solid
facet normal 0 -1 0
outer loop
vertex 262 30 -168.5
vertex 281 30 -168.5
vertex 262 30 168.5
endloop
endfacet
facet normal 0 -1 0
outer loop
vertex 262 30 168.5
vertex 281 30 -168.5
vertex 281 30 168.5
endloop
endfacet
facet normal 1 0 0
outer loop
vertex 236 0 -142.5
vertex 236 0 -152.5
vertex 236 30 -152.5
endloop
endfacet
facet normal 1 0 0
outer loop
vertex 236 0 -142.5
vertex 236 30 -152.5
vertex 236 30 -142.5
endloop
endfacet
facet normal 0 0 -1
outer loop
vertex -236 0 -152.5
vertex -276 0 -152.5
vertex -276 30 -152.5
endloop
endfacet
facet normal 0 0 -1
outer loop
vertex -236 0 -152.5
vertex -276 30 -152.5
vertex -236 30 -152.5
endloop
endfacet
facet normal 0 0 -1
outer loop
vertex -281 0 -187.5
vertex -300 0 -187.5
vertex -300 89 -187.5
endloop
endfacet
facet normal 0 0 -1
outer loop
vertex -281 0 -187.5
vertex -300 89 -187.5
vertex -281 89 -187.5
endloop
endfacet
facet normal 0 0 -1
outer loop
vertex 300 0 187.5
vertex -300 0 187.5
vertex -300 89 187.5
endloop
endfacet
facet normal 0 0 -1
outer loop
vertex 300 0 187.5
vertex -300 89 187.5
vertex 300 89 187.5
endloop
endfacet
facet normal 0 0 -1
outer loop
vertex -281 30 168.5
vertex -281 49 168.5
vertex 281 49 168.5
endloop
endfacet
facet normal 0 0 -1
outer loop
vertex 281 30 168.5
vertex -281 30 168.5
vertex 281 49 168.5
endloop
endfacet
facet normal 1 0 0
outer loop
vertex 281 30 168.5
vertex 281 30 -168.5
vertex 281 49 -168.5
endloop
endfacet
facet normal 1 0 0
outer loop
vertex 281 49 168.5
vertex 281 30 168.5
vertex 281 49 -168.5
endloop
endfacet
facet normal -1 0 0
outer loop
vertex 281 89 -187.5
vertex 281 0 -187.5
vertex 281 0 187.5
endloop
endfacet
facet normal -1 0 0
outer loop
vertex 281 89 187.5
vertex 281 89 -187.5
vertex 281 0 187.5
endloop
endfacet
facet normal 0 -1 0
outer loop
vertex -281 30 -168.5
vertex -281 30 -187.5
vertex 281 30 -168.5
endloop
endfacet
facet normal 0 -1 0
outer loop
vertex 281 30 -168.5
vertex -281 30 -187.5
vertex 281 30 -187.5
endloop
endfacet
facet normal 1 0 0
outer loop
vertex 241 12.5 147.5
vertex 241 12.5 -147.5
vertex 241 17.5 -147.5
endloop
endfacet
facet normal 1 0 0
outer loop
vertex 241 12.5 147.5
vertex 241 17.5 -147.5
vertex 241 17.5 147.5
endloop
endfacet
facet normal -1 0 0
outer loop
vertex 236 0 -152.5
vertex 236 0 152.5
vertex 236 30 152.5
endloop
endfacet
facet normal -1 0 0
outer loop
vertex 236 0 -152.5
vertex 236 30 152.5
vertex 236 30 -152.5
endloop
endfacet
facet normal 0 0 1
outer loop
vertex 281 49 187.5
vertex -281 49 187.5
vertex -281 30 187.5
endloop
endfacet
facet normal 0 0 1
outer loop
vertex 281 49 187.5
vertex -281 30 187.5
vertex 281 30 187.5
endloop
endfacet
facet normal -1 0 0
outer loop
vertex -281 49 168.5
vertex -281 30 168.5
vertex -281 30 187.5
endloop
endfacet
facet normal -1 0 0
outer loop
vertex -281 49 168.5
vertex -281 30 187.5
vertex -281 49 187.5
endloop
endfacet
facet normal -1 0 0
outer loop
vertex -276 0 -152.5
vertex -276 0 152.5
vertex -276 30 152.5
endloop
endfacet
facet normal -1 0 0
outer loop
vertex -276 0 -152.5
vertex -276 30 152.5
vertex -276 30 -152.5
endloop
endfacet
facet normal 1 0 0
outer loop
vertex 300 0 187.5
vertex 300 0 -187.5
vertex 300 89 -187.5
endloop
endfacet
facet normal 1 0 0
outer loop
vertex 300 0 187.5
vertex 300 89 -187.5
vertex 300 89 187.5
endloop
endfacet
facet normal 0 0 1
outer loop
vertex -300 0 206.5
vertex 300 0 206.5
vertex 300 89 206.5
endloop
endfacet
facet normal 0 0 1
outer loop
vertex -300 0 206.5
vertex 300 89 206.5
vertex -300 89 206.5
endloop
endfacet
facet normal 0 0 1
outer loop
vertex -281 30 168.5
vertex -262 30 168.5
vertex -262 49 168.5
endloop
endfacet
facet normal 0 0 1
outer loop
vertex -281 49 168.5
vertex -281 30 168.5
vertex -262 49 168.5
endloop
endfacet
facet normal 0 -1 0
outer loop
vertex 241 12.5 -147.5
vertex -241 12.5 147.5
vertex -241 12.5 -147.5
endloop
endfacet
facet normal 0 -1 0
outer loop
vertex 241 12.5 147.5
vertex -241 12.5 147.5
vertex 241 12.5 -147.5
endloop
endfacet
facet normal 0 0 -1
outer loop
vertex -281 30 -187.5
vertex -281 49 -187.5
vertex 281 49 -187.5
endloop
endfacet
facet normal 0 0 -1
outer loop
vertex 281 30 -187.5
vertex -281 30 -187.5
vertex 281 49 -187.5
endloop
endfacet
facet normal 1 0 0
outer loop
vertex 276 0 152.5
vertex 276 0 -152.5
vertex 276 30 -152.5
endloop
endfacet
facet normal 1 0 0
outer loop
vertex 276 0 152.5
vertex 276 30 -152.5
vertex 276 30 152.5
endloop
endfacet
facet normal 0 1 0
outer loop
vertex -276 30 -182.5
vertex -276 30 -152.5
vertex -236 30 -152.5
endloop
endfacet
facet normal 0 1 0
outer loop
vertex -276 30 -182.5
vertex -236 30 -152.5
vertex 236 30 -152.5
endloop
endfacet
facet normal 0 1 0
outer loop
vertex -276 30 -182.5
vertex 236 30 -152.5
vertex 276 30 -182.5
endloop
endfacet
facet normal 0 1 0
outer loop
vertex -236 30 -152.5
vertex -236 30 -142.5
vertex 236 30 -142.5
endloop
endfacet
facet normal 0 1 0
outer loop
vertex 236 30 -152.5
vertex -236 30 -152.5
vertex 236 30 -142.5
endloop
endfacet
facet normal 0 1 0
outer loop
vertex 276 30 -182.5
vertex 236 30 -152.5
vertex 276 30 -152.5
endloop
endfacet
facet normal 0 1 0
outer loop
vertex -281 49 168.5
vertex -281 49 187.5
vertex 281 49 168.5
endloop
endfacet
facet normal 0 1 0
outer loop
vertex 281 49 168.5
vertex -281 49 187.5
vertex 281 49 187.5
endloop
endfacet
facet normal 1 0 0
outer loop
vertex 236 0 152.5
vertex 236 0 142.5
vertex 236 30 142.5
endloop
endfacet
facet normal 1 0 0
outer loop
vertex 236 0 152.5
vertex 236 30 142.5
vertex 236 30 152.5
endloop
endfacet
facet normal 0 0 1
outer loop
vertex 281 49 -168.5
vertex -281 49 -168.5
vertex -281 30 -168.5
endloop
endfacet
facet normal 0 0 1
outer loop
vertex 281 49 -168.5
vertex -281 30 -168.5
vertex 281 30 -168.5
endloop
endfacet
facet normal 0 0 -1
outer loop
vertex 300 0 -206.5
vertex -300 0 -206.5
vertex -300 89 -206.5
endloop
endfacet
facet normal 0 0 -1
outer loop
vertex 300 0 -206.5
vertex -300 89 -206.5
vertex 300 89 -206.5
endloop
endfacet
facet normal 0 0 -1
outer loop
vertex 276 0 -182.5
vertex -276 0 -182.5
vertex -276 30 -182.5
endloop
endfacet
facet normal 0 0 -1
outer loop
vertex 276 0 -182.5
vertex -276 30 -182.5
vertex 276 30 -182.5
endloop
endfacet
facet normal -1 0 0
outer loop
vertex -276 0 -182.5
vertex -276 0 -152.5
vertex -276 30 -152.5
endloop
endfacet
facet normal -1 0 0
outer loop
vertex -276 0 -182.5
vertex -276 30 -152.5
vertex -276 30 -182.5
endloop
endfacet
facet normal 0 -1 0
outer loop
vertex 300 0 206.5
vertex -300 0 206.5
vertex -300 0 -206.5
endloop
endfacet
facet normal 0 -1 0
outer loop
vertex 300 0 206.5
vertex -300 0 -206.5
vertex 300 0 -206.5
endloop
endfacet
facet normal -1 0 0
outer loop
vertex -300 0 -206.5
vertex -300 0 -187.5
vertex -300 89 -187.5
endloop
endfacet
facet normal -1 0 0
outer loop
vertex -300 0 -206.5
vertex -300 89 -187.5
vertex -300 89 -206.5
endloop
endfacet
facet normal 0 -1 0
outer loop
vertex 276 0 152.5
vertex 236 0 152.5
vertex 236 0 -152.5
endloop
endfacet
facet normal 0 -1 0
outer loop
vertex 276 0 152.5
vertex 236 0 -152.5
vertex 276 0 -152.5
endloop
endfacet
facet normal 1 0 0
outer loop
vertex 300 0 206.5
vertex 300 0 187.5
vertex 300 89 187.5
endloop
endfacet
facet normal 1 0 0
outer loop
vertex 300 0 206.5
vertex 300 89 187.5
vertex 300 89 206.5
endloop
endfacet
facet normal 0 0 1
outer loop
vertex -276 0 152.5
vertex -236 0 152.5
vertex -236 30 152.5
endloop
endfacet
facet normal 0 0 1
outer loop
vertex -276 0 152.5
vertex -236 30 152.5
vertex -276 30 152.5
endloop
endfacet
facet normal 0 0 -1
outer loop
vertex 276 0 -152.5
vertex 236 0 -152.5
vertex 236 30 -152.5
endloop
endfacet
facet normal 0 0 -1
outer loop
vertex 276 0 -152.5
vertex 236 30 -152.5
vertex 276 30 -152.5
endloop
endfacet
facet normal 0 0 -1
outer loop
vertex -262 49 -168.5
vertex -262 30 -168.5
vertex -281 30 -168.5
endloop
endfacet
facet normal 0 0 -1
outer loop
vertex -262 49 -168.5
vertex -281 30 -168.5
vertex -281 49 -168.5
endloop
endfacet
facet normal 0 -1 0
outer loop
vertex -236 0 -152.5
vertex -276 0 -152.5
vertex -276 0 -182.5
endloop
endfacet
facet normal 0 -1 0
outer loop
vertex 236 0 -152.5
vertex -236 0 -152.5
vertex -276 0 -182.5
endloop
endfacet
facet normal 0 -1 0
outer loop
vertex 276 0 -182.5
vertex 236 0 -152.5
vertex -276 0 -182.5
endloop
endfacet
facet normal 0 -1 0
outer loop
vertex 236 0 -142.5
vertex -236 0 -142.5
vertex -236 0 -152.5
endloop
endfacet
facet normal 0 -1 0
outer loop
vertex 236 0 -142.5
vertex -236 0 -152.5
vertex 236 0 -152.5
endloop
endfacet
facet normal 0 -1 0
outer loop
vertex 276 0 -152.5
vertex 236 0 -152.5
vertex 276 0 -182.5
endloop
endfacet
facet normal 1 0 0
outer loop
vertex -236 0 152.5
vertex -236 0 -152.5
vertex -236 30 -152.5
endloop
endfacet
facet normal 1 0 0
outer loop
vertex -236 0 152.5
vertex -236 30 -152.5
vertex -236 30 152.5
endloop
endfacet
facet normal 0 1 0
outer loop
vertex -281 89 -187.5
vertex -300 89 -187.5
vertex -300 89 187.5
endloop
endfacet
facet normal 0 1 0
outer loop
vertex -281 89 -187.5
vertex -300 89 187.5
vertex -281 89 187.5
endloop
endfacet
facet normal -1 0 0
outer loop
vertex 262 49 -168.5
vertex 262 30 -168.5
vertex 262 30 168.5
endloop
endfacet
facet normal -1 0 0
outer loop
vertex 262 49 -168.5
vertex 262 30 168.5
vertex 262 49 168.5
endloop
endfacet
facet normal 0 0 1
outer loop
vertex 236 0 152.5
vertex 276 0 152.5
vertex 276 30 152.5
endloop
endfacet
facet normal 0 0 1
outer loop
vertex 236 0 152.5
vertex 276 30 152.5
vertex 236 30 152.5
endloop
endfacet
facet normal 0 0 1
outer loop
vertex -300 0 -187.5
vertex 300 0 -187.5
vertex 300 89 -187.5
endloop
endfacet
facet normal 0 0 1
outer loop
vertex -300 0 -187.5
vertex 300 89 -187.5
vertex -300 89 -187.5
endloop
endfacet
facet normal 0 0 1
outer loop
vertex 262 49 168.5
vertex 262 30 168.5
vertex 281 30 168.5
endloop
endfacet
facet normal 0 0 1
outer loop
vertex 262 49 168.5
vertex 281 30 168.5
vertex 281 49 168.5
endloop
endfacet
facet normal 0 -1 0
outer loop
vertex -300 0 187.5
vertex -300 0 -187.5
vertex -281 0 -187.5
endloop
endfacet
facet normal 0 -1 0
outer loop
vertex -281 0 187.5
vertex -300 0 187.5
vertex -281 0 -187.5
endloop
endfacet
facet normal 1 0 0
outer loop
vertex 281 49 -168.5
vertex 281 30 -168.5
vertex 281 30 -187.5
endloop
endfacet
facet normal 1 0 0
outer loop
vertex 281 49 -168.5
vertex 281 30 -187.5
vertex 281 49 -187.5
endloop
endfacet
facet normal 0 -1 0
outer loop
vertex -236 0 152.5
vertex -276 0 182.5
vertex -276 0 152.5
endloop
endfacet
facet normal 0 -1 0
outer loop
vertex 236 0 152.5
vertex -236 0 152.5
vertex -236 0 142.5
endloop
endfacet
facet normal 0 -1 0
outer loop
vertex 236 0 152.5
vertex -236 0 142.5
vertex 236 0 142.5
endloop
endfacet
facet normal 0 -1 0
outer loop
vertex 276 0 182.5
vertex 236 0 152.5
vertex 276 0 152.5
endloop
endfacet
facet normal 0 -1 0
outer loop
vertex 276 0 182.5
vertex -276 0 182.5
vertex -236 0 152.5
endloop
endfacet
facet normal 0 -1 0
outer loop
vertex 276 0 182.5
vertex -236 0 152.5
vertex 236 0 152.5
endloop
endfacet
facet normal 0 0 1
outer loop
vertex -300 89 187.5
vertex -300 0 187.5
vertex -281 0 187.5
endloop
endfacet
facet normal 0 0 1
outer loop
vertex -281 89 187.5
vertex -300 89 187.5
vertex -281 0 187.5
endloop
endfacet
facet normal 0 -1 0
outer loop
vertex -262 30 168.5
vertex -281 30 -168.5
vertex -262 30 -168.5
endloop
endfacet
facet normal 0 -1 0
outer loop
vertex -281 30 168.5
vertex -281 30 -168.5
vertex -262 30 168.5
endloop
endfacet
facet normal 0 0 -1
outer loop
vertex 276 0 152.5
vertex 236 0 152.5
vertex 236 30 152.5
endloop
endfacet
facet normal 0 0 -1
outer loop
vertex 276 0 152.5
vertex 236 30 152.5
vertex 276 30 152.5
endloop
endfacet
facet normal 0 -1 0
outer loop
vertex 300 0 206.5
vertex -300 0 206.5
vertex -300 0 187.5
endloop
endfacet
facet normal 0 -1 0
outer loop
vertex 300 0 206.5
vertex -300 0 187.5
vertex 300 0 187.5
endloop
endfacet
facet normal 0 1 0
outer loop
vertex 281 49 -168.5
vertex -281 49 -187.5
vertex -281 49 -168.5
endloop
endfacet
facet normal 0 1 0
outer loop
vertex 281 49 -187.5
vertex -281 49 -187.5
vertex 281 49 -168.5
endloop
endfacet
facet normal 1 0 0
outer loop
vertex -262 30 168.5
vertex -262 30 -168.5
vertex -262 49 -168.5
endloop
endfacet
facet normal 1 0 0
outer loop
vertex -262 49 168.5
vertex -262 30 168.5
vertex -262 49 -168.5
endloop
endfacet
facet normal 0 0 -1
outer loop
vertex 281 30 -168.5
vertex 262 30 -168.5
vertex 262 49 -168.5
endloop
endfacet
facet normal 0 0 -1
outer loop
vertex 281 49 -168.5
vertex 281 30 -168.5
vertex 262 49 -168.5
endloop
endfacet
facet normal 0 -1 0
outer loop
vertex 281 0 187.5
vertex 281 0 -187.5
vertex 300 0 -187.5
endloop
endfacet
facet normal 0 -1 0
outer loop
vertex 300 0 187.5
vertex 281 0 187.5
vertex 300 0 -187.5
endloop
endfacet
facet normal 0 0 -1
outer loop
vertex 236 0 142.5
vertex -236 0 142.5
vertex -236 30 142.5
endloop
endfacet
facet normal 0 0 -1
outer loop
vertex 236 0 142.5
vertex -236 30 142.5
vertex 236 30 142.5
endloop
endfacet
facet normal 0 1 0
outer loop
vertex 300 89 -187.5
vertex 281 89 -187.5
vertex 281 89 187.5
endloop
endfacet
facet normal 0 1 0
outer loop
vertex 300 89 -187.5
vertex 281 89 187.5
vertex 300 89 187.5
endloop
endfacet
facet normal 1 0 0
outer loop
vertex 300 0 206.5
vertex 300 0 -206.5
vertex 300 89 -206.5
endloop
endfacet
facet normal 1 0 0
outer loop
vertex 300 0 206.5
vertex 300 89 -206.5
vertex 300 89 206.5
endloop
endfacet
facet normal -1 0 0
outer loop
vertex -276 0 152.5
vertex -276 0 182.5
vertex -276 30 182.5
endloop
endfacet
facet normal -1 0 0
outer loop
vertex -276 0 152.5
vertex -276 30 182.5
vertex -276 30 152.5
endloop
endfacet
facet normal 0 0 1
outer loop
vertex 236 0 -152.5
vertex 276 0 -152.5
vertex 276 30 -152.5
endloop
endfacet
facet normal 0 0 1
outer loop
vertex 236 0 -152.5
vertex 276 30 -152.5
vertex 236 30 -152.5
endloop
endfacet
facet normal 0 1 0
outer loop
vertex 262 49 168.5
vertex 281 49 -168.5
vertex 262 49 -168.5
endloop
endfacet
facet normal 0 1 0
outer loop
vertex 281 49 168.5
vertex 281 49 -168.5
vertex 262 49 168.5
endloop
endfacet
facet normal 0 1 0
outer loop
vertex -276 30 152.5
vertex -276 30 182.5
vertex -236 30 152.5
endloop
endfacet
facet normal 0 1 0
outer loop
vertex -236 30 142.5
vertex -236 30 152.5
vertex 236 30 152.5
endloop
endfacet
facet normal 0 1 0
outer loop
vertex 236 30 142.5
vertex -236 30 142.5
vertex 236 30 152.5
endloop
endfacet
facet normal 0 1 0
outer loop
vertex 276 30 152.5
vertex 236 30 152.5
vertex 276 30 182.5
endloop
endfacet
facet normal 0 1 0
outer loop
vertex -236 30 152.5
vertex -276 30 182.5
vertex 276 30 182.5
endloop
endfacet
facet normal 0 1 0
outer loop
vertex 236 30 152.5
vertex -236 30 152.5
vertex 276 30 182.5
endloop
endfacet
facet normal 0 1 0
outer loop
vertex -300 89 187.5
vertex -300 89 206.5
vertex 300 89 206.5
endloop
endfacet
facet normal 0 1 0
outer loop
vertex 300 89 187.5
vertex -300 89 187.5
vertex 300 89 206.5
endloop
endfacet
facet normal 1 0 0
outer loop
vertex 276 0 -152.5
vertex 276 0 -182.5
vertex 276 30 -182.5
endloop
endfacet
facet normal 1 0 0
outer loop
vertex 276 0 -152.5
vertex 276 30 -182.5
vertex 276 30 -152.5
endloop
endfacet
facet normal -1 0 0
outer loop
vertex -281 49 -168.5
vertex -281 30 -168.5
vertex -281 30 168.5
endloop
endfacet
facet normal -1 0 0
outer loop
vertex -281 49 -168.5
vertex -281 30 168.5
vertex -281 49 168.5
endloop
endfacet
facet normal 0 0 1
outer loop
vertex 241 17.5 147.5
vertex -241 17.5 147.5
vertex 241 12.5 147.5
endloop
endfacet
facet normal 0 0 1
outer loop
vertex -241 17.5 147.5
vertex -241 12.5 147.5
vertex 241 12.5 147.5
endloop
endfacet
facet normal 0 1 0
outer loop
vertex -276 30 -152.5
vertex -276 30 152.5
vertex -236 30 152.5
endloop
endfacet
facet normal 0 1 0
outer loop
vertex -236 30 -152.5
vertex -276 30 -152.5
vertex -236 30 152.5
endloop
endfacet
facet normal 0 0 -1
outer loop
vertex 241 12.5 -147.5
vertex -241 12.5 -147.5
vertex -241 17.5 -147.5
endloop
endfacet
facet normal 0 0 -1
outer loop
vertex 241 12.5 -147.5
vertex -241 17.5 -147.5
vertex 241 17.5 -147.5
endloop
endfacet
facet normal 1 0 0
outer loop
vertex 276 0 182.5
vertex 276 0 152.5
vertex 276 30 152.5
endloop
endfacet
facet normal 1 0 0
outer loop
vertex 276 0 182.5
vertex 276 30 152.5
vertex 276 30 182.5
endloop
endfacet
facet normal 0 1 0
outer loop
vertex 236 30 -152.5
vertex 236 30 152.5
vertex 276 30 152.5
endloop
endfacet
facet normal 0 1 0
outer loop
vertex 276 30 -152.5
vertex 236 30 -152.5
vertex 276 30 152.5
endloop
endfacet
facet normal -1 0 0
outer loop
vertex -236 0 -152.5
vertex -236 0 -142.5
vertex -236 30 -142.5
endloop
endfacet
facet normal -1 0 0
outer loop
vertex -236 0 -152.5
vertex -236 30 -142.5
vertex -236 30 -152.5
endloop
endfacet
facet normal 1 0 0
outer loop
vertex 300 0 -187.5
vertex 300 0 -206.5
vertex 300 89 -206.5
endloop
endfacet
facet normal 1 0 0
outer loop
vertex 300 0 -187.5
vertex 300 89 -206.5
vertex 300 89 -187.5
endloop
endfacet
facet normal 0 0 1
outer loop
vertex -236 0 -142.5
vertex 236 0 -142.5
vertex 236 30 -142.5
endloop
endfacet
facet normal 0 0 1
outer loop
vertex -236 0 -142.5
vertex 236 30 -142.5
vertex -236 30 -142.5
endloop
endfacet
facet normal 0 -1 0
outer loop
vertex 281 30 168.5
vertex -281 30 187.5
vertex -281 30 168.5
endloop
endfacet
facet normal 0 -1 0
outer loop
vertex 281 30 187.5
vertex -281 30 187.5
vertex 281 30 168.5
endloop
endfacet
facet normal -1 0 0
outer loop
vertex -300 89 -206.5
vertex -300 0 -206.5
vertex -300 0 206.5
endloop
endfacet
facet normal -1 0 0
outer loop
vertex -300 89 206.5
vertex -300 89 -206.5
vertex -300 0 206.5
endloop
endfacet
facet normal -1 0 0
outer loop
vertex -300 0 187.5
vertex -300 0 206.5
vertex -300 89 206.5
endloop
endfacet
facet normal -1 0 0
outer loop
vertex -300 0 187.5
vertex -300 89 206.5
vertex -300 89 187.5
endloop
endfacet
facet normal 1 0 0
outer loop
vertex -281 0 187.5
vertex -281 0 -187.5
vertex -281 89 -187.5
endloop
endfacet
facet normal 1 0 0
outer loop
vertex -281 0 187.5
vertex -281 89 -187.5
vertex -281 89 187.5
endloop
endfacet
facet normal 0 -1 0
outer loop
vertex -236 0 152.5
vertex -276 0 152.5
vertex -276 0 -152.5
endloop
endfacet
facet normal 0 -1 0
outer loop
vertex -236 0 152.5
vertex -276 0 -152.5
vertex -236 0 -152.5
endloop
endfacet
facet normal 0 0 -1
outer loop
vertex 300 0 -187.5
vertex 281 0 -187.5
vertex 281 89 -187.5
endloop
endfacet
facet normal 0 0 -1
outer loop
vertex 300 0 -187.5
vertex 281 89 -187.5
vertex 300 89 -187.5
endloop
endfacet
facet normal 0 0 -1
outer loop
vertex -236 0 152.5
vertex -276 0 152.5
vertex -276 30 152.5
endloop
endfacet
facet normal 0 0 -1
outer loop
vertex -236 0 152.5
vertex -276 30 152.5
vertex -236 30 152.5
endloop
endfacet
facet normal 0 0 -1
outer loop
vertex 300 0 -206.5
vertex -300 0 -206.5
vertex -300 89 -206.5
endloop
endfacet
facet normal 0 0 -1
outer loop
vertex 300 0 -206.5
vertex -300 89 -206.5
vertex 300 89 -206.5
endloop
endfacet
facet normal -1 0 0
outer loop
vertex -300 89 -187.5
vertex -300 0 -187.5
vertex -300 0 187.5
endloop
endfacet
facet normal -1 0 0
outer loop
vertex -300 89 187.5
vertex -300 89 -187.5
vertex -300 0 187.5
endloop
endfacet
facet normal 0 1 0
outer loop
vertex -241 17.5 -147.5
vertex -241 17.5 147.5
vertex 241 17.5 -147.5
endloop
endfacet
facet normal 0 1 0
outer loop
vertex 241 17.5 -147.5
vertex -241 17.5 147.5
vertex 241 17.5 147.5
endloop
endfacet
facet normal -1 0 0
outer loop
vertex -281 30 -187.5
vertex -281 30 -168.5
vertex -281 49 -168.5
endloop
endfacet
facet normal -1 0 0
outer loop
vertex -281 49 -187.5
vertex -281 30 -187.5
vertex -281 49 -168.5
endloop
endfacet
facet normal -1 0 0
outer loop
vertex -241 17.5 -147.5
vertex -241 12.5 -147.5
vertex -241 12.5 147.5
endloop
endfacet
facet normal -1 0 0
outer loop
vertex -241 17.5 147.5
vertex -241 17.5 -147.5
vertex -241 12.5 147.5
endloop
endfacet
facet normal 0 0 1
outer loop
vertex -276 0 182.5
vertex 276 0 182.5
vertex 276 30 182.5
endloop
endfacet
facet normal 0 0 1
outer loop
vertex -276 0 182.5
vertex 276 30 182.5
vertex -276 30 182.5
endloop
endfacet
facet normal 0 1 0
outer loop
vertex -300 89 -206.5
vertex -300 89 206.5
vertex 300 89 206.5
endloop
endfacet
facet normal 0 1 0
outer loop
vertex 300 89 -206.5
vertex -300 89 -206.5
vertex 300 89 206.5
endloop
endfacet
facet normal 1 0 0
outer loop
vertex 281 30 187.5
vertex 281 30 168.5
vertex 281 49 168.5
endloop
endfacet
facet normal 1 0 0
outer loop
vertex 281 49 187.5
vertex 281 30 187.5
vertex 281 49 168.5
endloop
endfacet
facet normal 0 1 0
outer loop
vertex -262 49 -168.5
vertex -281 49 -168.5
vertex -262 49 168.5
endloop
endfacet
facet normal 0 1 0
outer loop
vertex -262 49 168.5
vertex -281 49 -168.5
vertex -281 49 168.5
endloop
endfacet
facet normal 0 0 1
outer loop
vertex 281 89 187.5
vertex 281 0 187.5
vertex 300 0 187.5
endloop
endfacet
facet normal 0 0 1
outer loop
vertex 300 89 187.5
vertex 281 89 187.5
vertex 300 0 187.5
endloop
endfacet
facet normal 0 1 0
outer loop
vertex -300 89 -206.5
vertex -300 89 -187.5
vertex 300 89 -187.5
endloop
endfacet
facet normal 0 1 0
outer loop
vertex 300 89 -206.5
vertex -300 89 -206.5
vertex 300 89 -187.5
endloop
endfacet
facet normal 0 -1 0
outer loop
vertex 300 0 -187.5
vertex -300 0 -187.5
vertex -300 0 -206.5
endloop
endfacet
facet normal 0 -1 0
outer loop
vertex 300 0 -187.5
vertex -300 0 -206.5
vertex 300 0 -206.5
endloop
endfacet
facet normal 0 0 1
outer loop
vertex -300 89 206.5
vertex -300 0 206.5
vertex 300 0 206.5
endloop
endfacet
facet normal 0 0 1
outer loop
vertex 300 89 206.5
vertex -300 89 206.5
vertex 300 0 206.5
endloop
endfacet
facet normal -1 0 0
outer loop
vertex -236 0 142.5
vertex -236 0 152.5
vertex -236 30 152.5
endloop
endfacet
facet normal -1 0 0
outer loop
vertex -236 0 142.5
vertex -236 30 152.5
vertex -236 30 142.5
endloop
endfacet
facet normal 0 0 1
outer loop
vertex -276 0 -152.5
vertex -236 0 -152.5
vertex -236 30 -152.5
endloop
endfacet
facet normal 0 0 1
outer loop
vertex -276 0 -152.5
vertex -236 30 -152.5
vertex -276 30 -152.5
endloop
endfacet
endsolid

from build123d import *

# Parameters (mm, degrees)
F1_W      = 600
F1_H      = 413
F2_DEPTH  = 89
F4_DEPTH  = 89
F5_DEPTH  = 89
F3_W      = 19
F3_H      = 375
F6_DEPTH  = 89
F7_DEPTH  = 89
F10_DEPTH = 30
F11_DEPTH = 30
F12_DEPTH = 30
F13_DEPTH = 30
F15_W     = 482
F15_H     = 295
F16_DEPTH = 2.5
F17_W     = 562
F17_H     = 19
F18_DEPTH = 19
F20_W     = 19
F20_H     = 337
F21_DEPTH = 19


with BuildPart() as f2:
    # F1 (on Front) → F2 (new body)
    with BuildSketch(Plane.XZ):
        Rectangle(F1_W, F1_H)
    extrude(amount=-F2_DEPTH)


with BuildPart() as f4:
    # F3 (on face) → F4 (new body, through all)
    with BuildSketch(Plane.XZ):
        Polygon((-300, -187.5), (-300, -206.5), (300, -206.5), (300, -187.5), (281, -187.5), (-281, -187.5), align=None)
    extrude(amount=-F4_DEPTH)


with BuildPart() as f5:
    # F3 (on face) → F5 (new body, through all)
    with BuildSketch(Plane.XZ):
        Polygon((-300, 206.5), (-300, 187.5), (-281, 187.5), (281, 187.5), (300, 187.5), (300, 206.5), align=None)
    extrude(amount=-F5_DEPTH)


with BuildPart() as f6:
    # F3 (on face) → F6 (new body, through all)
    with BuildSketch(Plane.XZ):
        with Locations((-290.5, 0)):
            Rectangle(F3_W, F3_H)
    extrude(amount=-F6_DEPTH)


with BuildPart() as f7:
    # F3 (on face) → F7 (new body, through all)
    with BuildSketch(Plane.XZ):
        with Locations((290.5, 0)):
            Rectangle(F3_W, F3_H)
    extrude(amount=-F7_DEPTH)


with BuildPart() as f10:
    # F9 (on offset) → F10 (new body)
    with BuildSketch(Plane.XZ):
        Polygon((276, 182.5), (-276, 182.5), (-276, 152.5), (-236, 152.5), (-236, 142.5), (236, 142.5), (236, 152.5), (276, 152.5), align=None)
    extrude(amount=-F10_DEPTH)


with BuildPart() as f11:
    # F9 (on offset) → F11 (new body)
    with BuildSketch(Plane.XZ):
        Polygon((-236, -152.5), (-276, -152.5), (-276, -182.5), (276, -182.5), (276, -152.5), (236, -152.5), (236, -142.5), (-236, -142.5), align=None)
    extrude(amount=-F11_DEPTH)


with BuildPart() as f12:
    # F9 (on offset) → F12 (new body)
    with BuildSketch(Plane.XZ):
        Polygon((-236, 152.5), (-276, 152.5), (-276, -152.5), (-236, -152.5), (-236, -142.5), (-236, 142.5), align=None)
    extrude(amount=-F12_DEPTH)


with BuildPart() as f13:
    # F9 (on offset) → F13 (new body)
    with BuildSketch(Plane.XZ):
        Polygon((276, -152.5), (276, 152.5), (236, 152.5), (236, 142.5), (236, -142.5), (236, -152.5), align=None)
    extrude(amount=-F13_DEPTH)


with BuildPart() as f16:
    # F15 (on offset) → F16 (new body, symmetric)
    with BuildSketch(Plane.XZ.offset(-15)):
        Rectangle(F15_W, F15_H)
    extrude(amount=F16_DEPTH, both=True)


with BuildPart() as f18:
    # F17 (on face) → F18 (new body)
    with BuildSketch(Plane.XY.offset(-187.5)):
        with Locations((0, 39.5)):
            Rectangle(F17_W, F17_H)
    extrude(amount=F18_DEPTH)


with BuildPart() as f19_1:
    # F19: instance of F18
    add(f18.part.mirror(Plane.XY))


with BuildPart() as f21:
    # F20 (on face) → F21 (new body)
    with BuildSketch(Plane.YZ.offset(-281)):
        with Locations((39.5, 0)):
            Rectangle(F20_W, F20_H)
    extrude(amount=F21_DEPTH)


with BuildPart() as f22_1:
    # F22: instance of F21
    add(f21.part.mirror(Plane.YZ))


solid = Compound([f2.part, f4.part, f5.part, f6.part, f7.part, f10.part, f11.part, f12.part, f13.part, f16.part, f18.part, f19_1.part, f21.part, f22_1.part])
